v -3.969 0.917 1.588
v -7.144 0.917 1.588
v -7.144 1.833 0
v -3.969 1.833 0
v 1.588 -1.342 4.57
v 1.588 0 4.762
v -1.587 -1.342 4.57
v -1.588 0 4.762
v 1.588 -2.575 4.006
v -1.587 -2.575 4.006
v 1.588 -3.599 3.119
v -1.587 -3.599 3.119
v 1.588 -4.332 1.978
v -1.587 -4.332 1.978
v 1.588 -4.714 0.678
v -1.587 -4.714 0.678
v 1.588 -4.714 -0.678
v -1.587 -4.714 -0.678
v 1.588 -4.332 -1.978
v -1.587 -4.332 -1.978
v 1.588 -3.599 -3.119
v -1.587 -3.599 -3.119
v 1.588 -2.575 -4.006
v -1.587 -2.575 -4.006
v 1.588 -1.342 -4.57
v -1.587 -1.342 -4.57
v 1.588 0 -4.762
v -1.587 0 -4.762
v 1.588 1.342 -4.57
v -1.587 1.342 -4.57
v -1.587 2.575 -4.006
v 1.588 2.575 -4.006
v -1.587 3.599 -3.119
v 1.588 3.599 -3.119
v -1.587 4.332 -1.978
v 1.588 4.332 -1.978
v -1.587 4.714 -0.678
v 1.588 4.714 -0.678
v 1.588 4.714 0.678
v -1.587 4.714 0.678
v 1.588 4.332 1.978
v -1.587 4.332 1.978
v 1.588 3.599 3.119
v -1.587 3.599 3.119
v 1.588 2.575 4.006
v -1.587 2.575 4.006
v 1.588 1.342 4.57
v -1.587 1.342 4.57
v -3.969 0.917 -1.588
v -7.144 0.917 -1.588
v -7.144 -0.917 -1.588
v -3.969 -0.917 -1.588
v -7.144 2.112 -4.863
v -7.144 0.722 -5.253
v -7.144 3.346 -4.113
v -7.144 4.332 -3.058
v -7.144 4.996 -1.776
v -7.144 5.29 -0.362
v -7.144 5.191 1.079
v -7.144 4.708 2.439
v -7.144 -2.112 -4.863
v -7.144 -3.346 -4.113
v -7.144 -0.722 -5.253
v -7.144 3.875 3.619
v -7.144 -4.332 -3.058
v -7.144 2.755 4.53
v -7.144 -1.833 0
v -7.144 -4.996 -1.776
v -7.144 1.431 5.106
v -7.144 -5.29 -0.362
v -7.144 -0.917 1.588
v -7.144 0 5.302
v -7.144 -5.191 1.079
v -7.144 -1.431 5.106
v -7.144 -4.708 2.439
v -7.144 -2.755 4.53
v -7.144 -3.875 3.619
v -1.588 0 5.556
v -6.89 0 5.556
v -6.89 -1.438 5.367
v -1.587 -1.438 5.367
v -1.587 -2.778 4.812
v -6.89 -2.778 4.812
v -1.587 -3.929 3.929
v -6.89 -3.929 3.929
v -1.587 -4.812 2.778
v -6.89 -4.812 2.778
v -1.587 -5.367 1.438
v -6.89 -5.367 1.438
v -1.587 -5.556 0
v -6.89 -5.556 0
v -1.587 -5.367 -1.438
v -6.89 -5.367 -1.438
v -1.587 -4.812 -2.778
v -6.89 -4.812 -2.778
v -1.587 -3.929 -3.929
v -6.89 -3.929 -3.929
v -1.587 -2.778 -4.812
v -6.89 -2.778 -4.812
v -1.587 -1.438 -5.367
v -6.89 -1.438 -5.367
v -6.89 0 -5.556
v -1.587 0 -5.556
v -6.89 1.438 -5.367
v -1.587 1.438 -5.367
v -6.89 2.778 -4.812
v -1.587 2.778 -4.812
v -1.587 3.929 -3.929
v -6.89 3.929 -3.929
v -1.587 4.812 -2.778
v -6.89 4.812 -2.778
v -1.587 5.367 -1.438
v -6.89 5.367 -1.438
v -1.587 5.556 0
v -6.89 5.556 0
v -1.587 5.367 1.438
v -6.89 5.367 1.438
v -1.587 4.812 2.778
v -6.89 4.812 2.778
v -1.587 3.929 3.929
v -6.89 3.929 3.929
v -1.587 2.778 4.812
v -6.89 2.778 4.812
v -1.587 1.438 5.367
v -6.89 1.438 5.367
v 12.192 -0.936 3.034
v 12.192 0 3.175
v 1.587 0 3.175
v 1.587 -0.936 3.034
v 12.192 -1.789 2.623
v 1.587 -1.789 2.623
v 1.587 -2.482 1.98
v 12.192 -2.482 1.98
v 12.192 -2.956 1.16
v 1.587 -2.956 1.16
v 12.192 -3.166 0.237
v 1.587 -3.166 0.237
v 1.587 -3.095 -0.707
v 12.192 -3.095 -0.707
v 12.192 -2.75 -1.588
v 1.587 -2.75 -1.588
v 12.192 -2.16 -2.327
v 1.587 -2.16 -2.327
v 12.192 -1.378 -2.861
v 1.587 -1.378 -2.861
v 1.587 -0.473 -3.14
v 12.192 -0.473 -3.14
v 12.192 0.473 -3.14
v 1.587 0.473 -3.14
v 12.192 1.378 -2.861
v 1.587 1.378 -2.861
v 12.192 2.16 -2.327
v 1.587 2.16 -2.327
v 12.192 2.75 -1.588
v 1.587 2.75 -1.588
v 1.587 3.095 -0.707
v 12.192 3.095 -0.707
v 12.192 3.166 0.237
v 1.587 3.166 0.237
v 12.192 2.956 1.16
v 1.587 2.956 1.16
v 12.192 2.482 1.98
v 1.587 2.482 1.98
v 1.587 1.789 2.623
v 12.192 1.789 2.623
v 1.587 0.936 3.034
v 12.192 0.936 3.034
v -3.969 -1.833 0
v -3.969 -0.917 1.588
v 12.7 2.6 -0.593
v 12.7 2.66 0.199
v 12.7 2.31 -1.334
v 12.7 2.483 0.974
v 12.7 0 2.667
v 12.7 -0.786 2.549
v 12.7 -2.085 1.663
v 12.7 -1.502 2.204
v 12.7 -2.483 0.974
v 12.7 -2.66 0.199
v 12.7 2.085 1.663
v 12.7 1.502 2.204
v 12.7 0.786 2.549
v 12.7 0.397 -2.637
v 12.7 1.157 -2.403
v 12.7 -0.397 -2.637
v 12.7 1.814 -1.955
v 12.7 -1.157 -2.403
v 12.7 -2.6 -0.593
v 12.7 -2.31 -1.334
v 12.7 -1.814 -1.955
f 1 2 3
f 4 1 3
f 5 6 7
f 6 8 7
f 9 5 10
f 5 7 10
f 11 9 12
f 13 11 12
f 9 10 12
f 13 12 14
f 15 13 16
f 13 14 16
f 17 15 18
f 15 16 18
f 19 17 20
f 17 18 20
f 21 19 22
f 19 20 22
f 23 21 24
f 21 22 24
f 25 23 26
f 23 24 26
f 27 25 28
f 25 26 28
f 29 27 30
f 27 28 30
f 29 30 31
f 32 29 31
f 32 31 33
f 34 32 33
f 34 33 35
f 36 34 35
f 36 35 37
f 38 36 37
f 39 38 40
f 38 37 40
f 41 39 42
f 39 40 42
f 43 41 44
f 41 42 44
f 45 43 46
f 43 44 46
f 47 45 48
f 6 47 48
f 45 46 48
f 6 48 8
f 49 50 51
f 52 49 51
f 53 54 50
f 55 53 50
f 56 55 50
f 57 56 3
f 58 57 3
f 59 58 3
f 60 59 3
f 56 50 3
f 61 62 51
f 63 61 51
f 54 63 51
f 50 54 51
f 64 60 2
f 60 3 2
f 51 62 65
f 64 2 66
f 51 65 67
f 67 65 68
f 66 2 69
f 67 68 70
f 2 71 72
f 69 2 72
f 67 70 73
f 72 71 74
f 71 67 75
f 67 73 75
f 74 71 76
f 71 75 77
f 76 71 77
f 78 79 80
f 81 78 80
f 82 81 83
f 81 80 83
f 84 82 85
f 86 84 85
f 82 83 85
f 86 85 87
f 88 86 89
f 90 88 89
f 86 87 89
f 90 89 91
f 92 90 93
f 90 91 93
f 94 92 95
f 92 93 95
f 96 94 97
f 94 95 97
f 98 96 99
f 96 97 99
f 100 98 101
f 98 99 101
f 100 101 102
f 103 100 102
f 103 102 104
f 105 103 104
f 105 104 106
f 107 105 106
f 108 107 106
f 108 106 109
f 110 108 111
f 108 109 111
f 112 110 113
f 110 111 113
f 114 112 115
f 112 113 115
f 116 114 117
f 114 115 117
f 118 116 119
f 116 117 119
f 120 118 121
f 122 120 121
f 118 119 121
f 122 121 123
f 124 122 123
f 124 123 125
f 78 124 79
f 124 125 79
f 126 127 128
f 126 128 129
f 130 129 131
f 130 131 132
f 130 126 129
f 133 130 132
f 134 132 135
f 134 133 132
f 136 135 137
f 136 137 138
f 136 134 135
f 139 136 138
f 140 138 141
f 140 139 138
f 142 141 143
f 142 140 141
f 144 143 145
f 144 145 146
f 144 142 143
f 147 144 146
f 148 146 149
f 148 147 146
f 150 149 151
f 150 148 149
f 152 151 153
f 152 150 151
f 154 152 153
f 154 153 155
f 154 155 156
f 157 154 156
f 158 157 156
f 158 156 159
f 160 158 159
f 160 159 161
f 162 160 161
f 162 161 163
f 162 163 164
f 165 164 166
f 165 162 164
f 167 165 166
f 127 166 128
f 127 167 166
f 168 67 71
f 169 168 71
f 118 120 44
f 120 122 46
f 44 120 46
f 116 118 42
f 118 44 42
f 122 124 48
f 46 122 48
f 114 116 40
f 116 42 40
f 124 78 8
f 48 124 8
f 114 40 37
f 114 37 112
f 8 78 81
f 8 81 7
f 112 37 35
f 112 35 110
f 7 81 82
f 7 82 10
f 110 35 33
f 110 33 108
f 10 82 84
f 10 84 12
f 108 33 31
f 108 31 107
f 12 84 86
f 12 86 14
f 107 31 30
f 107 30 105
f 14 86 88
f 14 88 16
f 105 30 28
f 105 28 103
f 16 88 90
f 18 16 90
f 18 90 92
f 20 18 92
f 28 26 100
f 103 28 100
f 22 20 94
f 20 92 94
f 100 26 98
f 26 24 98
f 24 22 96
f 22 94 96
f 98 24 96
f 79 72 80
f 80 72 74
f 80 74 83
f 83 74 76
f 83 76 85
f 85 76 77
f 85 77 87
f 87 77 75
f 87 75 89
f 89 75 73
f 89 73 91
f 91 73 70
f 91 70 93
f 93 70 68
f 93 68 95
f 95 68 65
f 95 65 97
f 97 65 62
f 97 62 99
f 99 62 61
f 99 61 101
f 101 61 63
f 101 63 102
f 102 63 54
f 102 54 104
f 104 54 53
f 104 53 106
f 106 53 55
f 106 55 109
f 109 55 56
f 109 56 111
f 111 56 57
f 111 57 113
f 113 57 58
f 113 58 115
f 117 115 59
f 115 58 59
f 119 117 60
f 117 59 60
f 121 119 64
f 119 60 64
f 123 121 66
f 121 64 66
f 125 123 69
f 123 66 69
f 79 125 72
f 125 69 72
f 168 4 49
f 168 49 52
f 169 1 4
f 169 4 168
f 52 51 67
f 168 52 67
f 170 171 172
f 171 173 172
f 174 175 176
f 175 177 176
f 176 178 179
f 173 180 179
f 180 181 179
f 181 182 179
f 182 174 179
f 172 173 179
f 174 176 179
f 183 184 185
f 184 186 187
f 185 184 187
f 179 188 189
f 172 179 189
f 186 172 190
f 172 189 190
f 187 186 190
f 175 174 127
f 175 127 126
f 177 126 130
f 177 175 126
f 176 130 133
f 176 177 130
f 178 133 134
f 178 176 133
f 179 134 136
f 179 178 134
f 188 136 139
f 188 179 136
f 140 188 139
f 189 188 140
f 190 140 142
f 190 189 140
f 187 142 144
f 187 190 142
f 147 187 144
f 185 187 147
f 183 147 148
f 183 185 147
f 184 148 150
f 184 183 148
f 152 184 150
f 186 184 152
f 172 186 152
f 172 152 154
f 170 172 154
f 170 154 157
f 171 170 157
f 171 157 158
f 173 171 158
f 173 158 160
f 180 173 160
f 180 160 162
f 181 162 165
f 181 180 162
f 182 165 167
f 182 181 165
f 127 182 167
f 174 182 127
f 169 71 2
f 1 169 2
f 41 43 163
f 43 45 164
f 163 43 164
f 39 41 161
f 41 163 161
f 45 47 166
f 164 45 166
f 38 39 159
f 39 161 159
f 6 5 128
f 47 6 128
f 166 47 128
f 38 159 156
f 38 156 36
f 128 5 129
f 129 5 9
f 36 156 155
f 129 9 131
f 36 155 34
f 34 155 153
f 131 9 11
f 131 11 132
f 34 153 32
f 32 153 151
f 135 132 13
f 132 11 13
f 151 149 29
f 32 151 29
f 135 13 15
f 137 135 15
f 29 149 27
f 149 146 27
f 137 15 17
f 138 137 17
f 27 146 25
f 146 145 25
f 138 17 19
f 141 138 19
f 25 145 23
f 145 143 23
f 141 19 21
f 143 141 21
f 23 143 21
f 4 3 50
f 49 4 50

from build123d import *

# Parameters (mm, degrees)
F0_W     = 11.1125
F0_H     = 3.175
F5_DEPTH = 3.175
F6_SIZE  = 0.254
F7_SIZE  = 0.508


with BuildPart() as f1:
    # F0 (on Front) → F1 (revolve)
    with BuildSketch(Plane.XZ):
        Polygon((-1.5875, 0), (-1.5875, 4.7625), (-1.5875, 5.55625), (-7.14375, 5.55625), (-7.14375, 0), align=None)
    revolve(axis=Axis((2.778125, 0, 0), (1, 0, 0)))

    # F0 (on Front) → F2 (revolve)
    with BuildSketch(Plane.XZ):
        Polygon((1.5875, 3.175), (1.5875, 4.7625), (-1.5875, 4.7625), (-1.5875, 0), (1.5875, 0), align=None)
    revolve(axis=Axis((2.778125, 0, 0), (1, 0, 0)))

    # F0 (on Front) → F3 (revolve)
    with BuildSketch(Plane.XZ):
        with Locations((7.14375, 1.5875)):
            Rectangle(F0_W, F0_H)
    revolve(axis=Axis((2.778125, 0, 0), (1, 0, 0)))

    # F4 (on face) → F5 (cut)
    with BuildSketch(Plane(origin=(-7.14375, 0, 0), x_dir=(0, -1, 0), z_dir=(-1, 0, 0))):
        Polygon((1.833087, 0), (0.916544, 1.5875), (-0.916544, 1.5875), (-1.833087, 0), (-0.916544, -1.5875), (0.916544, -1.5875), align=None)
    extrude(amount=-F5_DEPTH, mode=Mode.SUBTRACT)

    # F6
    f6_edges = [f1.edges().sort_by_distance(p)[0] for p in [
        (-7.14375, 0, -5.55625),
    ]]
    chamfer(f6_edges, length=F6_SIZE)

    # F7
    f7_edges = [f1.edges().sort_by_distance(p)[0] for p in [
        (12.7, 0, -3.175),
    ]]
    chamfer(f7_edges, length=F7_SIZE)


solid = f1.part
